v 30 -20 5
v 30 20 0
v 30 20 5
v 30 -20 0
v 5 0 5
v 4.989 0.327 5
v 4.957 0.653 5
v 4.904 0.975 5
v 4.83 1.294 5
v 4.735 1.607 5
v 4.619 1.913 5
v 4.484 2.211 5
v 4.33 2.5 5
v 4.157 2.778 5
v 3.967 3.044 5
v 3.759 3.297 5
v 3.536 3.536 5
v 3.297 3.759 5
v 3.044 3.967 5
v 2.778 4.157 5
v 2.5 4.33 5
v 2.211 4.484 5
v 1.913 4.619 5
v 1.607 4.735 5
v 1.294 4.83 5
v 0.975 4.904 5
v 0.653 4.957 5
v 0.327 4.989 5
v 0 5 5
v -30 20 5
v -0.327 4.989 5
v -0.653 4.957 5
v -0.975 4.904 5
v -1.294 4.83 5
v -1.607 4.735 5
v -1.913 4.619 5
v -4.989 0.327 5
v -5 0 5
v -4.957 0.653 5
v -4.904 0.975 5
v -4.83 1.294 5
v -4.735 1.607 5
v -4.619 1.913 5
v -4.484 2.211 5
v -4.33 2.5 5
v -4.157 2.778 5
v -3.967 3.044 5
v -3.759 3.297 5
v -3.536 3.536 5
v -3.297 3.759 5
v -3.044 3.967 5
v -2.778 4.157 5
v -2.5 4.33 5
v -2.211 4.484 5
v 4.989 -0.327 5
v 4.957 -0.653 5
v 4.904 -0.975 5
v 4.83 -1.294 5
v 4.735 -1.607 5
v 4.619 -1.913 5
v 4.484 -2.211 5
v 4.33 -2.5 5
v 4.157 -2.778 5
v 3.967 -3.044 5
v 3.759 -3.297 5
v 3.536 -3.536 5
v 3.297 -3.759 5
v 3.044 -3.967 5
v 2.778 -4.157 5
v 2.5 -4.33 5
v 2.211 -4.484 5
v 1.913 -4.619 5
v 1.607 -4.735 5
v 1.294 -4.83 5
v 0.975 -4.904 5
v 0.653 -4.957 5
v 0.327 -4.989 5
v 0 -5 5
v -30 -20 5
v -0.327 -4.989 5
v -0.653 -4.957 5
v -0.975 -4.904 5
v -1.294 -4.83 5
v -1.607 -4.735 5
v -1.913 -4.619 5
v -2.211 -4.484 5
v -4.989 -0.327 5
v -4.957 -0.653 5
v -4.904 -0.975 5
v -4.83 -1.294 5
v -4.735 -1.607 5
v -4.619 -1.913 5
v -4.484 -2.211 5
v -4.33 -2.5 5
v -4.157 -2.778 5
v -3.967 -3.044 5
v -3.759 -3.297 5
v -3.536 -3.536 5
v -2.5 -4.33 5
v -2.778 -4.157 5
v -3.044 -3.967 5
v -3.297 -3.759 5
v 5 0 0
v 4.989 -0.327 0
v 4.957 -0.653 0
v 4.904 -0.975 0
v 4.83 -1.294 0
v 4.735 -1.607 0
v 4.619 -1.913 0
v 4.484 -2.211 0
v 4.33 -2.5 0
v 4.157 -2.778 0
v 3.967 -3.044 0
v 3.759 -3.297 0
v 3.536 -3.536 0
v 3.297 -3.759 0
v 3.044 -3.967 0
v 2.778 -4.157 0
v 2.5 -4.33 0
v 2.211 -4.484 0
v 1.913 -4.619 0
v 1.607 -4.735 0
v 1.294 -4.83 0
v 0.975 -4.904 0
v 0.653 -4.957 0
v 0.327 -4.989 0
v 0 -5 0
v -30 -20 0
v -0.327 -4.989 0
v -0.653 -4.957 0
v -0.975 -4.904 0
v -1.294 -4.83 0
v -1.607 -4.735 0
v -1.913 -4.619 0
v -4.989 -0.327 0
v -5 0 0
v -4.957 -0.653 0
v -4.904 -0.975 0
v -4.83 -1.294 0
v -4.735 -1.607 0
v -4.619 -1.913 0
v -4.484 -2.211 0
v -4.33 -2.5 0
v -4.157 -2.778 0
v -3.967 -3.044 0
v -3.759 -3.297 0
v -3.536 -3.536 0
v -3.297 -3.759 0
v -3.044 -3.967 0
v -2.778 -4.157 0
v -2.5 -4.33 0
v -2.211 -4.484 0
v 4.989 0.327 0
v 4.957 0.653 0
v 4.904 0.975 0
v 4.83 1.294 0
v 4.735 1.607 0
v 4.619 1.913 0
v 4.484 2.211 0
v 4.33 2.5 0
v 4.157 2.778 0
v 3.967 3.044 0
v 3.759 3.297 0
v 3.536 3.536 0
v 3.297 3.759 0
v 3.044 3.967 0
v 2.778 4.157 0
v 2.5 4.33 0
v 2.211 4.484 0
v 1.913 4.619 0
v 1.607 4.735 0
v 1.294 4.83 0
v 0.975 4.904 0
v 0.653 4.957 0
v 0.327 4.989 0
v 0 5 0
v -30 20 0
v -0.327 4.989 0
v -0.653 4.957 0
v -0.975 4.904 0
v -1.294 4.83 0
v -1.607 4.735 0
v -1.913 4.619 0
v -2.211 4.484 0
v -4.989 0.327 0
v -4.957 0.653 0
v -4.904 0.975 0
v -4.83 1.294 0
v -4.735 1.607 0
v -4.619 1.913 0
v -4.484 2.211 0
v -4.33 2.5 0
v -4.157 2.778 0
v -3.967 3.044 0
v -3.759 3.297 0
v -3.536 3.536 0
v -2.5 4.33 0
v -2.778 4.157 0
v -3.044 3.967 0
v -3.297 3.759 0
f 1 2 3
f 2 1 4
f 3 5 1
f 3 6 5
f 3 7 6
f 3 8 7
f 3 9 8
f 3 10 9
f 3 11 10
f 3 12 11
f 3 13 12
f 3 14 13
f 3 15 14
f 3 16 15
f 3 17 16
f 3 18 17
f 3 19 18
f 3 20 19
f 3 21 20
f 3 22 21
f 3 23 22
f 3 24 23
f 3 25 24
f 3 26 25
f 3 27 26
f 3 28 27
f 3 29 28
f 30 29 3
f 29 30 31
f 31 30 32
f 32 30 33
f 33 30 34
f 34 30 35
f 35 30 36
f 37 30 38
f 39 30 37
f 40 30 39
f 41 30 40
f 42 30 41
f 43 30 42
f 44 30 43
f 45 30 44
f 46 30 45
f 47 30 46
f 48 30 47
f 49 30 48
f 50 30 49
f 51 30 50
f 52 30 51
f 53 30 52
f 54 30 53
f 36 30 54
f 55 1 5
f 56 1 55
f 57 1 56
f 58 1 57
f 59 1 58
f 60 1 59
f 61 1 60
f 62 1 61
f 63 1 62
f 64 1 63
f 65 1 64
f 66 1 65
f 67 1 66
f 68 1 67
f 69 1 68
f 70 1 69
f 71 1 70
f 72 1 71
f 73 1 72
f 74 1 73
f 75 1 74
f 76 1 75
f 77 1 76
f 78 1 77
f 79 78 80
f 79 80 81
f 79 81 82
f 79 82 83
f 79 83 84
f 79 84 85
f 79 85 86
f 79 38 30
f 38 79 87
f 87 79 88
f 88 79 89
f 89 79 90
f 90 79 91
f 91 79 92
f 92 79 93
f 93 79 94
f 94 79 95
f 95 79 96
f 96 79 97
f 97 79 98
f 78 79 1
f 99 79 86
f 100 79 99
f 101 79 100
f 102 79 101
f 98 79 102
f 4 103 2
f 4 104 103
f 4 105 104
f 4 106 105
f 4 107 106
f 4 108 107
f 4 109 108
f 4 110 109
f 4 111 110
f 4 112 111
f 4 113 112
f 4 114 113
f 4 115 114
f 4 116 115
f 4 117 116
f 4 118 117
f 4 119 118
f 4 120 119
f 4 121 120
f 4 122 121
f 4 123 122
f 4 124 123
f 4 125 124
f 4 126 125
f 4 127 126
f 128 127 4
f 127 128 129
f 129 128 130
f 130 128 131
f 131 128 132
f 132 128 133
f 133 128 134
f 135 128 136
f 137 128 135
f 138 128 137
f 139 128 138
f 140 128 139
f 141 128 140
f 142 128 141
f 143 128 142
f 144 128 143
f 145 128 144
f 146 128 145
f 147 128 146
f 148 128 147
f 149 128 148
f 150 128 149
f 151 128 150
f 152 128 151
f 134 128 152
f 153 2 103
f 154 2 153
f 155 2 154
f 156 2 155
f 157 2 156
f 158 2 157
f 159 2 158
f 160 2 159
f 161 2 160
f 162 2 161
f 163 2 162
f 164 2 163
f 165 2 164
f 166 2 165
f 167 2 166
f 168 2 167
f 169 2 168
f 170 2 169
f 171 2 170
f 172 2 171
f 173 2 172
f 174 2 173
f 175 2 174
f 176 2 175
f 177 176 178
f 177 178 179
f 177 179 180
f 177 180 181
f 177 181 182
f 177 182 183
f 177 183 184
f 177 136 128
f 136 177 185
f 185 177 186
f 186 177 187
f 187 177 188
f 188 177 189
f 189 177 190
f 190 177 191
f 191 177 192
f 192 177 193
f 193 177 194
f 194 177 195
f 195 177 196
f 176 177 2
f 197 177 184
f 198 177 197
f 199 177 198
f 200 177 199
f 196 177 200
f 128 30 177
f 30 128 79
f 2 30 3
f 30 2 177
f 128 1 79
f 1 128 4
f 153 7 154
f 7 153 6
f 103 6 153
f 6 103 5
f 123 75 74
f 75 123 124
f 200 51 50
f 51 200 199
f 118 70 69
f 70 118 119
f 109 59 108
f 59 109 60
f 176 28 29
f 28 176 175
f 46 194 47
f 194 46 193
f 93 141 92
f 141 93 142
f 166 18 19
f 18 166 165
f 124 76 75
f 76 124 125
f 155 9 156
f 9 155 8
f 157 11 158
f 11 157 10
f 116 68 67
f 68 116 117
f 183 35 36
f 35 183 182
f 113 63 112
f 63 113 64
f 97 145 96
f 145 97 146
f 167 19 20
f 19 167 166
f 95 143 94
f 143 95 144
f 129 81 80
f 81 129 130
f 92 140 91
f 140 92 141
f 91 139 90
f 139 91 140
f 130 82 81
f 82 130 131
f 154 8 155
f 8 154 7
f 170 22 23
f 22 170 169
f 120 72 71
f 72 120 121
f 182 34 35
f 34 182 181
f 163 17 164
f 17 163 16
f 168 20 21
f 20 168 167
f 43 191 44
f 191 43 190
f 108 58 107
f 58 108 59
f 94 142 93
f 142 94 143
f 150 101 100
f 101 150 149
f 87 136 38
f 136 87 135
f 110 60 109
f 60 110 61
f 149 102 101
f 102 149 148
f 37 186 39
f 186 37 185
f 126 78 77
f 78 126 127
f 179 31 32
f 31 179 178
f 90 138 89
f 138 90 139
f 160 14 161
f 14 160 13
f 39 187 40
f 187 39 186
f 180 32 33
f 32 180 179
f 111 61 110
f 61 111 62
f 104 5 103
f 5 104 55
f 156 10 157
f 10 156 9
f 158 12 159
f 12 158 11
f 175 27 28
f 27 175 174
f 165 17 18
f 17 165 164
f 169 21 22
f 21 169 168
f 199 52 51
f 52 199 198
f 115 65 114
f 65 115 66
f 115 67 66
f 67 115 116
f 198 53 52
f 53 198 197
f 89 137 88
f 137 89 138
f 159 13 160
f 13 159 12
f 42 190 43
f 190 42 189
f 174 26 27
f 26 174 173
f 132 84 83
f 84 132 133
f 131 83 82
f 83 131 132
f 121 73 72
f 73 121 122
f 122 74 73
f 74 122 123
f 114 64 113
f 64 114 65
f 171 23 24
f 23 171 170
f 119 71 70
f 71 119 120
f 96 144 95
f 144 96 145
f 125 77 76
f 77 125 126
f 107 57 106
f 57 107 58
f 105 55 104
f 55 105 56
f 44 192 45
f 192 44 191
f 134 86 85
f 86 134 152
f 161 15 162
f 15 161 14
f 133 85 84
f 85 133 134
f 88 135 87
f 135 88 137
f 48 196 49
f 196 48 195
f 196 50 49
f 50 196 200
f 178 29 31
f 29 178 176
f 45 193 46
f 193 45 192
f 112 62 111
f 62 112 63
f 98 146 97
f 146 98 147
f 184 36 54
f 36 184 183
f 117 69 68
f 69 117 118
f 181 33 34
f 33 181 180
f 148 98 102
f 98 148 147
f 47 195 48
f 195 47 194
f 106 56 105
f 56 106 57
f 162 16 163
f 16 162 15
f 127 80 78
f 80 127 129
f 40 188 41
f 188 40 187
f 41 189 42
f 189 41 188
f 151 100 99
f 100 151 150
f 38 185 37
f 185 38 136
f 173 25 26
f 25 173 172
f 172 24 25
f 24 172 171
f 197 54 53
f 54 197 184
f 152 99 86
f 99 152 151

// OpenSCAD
plate_length = 60; plate_width = 40; plate_thickness = 5; hole_diameter = 10;
$fn = 96;
difference() {
  translate([-plate_length/2, -plate_width/2, 0]) cube([plate_length, plate_width, plate_thickness]);
  translate([0, 0, -1]) cylinder(d = hole_diameter, h = plate_thickness + 2);
}
